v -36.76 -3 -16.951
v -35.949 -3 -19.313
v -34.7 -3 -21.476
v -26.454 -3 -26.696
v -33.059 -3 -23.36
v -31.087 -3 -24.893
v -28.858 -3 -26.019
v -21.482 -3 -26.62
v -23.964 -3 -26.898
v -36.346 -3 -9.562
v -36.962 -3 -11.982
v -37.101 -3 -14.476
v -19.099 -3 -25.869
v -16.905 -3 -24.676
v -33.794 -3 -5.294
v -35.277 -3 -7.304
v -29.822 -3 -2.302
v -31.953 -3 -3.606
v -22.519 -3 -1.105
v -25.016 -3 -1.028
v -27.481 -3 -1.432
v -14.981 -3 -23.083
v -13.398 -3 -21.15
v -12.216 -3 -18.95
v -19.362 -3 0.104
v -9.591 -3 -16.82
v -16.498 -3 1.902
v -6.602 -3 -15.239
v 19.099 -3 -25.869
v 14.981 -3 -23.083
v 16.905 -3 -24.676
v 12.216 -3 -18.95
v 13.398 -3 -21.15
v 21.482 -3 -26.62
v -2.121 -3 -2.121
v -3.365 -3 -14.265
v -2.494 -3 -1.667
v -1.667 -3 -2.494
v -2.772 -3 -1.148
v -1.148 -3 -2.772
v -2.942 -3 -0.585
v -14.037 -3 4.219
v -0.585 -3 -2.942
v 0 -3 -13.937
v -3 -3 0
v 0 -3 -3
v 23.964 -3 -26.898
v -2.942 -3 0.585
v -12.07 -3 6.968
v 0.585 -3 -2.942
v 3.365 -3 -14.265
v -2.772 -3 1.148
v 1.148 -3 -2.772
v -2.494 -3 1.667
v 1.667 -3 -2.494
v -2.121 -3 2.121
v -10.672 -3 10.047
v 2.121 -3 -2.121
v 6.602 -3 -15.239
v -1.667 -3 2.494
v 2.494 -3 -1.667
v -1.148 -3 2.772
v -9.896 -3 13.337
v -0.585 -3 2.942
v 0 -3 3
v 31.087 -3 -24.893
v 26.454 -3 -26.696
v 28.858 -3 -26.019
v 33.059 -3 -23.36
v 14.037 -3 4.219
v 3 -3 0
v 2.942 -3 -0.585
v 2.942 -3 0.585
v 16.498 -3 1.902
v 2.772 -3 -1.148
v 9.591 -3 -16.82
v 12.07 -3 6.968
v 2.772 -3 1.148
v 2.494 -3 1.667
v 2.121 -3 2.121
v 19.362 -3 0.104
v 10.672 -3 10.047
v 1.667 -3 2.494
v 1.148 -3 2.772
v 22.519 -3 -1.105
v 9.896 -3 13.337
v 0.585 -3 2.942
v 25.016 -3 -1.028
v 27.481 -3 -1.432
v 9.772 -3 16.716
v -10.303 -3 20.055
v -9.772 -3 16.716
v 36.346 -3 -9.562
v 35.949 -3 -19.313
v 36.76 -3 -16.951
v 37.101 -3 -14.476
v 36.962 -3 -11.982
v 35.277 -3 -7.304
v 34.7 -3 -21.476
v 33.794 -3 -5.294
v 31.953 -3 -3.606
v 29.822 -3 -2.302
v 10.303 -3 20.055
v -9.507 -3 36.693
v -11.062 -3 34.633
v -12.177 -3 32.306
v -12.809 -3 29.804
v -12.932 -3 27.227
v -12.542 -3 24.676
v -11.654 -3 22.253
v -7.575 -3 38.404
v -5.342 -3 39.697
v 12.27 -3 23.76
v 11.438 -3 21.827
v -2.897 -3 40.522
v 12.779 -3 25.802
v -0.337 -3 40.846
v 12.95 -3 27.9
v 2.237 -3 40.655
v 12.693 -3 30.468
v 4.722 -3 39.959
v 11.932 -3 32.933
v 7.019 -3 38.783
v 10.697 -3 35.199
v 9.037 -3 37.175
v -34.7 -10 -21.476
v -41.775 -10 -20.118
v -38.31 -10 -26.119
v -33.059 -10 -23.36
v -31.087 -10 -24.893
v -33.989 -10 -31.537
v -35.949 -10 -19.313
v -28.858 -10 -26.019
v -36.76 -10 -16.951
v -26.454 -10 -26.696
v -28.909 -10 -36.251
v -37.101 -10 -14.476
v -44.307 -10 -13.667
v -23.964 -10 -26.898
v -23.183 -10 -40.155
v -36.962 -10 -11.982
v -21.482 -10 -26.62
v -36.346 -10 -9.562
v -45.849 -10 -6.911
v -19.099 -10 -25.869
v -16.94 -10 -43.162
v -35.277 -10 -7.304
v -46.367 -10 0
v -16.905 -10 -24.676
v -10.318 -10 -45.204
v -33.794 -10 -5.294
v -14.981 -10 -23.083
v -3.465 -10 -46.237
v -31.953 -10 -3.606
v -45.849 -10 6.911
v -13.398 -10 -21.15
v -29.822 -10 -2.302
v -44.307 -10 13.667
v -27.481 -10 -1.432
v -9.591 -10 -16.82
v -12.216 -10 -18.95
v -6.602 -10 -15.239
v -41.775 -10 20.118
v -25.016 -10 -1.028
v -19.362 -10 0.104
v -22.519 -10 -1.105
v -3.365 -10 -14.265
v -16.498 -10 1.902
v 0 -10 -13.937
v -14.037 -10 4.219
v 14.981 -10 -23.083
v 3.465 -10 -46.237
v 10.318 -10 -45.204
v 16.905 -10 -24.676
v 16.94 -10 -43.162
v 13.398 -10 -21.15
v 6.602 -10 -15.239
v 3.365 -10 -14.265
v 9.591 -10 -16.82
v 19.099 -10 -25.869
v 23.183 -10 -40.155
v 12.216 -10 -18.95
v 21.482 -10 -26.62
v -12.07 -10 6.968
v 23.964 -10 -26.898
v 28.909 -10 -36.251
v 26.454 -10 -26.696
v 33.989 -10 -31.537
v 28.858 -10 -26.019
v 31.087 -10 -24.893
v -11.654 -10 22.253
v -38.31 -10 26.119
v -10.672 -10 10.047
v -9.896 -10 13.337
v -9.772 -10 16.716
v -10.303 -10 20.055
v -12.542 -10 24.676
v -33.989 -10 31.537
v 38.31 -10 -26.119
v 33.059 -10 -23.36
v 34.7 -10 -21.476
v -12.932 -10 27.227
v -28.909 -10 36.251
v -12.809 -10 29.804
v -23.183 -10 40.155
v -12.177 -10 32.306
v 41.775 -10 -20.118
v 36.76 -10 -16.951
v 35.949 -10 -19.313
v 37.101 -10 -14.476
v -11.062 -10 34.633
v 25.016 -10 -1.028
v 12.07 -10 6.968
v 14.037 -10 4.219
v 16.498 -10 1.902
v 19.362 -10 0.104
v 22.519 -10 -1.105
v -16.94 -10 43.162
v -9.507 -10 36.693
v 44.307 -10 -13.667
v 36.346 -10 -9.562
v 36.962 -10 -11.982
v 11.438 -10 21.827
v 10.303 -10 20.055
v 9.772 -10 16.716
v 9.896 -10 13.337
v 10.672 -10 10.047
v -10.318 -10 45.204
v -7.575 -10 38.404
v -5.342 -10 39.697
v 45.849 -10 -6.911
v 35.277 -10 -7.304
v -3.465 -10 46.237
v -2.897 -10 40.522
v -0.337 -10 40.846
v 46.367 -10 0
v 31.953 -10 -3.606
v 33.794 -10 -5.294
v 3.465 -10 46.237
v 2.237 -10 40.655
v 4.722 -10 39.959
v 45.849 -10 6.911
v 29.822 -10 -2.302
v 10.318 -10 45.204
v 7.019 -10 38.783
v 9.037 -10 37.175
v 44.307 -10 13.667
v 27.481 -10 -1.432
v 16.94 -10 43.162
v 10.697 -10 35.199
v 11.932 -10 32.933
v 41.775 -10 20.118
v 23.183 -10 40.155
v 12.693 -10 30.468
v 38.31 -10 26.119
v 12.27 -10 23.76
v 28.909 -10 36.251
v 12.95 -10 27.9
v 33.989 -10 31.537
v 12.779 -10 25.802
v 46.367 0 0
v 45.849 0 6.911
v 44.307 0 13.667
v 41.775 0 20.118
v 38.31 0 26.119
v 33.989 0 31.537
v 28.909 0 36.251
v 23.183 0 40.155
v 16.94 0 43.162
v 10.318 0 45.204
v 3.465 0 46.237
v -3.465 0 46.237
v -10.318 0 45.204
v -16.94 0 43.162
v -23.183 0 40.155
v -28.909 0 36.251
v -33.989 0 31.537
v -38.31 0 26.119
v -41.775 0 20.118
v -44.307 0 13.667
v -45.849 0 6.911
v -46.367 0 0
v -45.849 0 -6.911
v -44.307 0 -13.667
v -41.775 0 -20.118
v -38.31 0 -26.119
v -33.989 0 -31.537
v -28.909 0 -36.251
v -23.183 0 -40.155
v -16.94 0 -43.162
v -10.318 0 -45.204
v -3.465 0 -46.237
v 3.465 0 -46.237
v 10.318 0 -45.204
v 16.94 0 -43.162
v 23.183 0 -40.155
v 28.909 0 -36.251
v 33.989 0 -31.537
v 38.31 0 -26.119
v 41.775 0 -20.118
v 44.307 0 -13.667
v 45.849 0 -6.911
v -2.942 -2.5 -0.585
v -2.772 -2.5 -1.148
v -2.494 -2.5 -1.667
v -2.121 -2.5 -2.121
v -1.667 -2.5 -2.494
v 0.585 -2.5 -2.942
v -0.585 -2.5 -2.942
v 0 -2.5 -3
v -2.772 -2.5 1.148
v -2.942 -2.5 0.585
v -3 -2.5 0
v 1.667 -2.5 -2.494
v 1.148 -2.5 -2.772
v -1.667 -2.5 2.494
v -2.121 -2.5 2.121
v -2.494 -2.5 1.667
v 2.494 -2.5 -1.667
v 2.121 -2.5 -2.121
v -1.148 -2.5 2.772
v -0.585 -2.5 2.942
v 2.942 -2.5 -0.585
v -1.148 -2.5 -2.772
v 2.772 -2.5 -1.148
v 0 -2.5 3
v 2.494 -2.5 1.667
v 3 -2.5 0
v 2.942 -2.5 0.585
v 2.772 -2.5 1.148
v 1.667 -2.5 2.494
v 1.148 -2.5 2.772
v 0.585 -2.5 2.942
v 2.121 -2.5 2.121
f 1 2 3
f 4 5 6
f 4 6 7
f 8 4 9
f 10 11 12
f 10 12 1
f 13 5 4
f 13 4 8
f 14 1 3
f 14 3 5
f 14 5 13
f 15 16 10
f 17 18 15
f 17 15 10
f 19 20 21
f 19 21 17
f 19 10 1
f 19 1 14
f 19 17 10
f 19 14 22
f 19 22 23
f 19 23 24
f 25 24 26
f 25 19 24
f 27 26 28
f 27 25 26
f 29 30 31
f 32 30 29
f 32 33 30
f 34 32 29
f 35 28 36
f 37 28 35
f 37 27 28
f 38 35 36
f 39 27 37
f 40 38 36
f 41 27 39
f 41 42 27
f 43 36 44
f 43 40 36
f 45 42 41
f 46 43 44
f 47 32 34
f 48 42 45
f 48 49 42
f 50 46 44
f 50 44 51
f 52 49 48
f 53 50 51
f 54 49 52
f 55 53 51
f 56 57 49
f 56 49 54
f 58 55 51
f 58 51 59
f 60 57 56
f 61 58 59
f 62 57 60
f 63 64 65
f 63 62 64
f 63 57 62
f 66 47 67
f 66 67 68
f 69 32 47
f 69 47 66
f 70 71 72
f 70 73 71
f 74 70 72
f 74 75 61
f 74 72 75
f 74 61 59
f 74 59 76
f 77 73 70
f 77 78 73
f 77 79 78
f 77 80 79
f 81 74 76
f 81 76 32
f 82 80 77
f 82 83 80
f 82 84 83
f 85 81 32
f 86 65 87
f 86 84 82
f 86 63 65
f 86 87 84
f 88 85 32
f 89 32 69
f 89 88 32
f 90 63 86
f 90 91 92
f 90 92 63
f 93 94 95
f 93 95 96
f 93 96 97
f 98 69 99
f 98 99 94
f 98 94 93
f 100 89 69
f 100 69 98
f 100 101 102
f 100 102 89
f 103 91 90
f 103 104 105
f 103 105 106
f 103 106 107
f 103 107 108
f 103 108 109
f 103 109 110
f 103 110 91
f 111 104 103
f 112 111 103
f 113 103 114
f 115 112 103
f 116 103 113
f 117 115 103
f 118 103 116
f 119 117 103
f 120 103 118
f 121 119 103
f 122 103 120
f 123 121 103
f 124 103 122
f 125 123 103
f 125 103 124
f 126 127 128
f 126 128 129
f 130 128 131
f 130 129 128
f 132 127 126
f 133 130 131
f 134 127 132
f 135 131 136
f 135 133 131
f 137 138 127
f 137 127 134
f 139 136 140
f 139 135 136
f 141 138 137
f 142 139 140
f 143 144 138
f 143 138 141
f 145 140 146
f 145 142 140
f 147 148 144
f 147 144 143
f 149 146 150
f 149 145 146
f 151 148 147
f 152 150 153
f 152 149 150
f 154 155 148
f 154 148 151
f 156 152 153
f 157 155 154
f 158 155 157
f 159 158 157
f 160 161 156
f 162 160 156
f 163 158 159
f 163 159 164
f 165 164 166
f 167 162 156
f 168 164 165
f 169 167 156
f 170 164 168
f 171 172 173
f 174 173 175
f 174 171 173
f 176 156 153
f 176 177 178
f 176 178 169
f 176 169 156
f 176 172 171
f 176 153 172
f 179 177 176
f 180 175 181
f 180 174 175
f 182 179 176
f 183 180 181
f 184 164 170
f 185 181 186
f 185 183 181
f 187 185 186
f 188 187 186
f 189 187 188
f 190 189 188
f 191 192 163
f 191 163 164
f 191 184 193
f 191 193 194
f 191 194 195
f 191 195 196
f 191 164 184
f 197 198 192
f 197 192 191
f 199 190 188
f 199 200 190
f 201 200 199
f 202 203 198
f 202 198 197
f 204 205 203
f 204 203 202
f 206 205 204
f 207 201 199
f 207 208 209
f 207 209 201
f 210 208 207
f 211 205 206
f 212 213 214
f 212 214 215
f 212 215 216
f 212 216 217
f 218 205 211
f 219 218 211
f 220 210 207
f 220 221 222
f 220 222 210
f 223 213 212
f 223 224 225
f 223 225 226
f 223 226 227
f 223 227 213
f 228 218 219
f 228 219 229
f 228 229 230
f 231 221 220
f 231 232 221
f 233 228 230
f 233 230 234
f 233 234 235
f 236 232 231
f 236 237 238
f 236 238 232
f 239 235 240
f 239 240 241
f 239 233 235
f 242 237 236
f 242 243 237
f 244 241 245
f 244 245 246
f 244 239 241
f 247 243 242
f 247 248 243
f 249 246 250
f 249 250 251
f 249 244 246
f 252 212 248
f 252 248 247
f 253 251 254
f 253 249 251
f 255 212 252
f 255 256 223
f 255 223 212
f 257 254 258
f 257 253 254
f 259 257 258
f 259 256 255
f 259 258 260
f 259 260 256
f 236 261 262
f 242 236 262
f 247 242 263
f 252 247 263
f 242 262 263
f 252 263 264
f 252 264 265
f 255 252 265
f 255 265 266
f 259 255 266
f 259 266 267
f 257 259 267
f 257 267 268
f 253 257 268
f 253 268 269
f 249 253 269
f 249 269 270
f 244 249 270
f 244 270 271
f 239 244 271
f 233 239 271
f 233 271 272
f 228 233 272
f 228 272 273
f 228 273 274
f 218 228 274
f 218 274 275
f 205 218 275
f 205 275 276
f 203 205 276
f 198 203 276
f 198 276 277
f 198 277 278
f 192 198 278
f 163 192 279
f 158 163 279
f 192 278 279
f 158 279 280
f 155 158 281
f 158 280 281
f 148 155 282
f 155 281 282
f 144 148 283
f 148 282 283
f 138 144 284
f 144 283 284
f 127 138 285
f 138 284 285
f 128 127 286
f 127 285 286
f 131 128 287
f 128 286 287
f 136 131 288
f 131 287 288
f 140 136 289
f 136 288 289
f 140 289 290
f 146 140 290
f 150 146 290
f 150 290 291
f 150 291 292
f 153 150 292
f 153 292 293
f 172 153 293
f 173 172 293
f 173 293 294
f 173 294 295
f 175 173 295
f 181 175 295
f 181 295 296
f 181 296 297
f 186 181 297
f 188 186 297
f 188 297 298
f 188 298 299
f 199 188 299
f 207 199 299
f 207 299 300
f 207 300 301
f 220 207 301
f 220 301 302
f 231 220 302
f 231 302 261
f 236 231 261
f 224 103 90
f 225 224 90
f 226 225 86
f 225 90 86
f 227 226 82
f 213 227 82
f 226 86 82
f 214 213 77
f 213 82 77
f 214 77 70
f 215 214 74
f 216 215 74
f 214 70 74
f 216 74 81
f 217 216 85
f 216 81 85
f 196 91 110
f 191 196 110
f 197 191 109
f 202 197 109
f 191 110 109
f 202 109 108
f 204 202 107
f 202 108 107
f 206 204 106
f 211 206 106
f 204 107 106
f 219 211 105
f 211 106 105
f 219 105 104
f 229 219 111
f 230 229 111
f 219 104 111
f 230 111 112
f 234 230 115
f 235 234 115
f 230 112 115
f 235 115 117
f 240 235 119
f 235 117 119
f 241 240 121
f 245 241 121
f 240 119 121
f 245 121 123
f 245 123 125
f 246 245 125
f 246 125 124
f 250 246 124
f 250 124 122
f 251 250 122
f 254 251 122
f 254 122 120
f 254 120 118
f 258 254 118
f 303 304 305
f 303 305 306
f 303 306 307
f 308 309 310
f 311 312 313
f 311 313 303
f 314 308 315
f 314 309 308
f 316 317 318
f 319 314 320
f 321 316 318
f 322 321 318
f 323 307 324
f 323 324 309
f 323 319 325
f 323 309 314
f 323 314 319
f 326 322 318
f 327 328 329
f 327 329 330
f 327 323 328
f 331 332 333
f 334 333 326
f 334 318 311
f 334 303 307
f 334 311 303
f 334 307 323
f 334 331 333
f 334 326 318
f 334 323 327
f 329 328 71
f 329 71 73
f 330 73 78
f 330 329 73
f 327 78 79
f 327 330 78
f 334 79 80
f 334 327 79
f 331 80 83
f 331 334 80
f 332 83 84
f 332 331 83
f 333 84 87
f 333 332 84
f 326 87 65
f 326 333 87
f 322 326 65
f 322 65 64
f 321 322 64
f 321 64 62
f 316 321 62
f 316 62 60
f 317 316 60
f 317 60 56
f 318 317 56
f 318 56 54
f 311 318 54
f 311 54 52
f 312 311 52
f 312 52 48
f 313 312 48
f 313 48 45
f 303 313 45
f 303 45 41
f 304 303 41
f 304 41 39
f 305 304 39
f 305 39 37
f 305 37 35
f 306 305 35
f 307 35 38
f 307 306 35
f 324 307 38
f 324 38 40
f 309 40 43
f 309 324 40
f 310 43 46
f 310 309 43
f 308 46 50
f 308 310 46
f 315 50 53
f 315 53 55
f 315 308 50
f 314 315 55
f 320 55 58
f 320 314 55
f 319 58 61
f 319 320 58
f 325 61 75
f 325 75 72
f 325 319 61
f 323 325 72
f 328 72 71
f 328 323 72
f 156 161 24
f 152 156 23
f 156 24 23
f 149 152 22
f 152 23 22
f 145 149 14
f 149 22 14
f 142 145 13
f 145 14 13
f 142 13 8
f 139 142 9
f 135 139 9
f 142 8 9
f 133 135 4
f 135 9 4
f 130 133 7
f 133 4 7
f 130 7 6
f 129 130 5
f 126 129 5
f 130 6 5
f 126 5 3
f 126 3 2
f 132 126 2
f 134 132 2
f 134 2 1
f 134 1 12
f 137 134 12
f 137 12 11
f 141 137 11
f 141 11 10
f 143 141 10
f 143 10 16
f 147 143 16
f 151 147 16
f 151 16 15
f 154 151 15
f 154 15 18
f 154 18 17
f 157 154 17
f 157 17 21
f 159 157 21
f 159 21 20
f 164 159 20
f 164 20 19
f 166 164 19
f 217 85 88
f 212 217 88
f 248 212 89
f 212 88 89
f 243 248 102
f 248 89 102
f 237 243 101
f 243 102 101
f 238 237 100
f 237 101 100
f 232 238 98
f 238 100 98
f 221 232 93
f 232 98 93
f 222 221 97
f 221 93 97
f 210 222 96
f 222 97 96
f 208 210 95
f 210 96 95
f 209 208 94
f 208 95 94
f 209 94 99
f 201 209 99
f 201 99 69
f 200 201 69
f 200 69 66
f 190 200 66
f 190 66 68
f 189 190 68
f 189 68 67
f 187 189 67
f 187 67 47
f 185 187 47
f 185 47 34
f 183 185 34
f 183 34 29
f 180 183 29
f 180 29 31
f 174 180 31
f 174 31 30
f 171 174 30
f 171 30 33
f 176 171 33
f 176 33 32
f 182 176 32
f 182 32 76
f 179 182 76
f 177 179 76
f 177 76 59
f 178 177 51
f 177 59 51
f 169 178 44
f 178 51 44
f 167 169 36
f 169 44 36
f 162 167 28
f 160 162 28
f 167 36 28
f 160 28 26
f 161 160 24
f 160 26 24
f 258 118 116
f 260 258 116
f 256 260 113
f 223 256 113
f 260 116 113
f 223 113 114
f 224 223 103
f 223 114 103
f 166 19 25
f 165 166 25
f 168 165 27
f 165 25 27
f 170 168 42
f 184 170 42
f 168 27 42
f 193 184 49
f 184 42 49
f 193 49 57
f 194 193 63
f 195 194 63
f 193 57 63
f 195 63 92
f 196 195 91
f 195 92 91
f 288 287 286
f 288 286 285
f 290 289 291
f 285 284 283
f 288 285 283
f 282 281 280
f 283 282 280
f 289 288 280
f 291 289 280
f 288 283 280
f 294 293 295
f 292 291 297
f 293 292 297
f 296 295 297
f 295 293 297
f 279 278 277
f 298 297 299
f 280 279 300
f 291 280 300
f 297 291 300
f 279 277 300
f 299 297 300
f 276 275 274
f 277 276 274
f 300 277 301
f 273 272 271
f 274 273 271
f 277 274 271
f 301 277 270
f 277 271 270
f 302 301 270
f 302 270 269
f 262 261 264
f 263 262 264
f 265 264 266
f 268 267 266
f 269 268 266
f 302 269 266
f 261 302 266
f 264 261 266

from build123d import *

# Parameters (mm, degrees)
F0_R     = 46.3668582169
F1_DEPTH = 10
F0_R_2   = 12.95
F0_R_3   = 10.95
F0_R_4   = 3
F2_DEPTH = 3
F0_R_5   = 2.5
F3_DEPTH = 2.5


with BuildPart() as f1:
    # F0 (on Front) → F1 (new body)
    with BuildSketch(Plane.XZ):
        Circle(F0_R)
        with BuildLine():
            ThreePointArc((-10.3030346023, 20.0546205966), (-4.1399397278, 40.1704278267), (12.95, 27.9))
            ThreePointArc((12.95, 27.9), (12.2704278267, 23.7600602722), (10.3030346023, 20.0546205966))
            ThreePointArc((10.3030346023, 20.0546205966), (12.0696833018, 6.9684349033), (22.5193282011, -1.1046205966))
            ThreePointArc((22.5193282011, -1.1046205966), (32.7186411149, -4.2294931122), (37.1121087656, -13.95))
            ThreePointArc((37.1121087656, -13.95), (26.7120297045, -26.6464720771), (12.2162935988, -18.95))
            ThreePointArc((12.2162935988, -18.95), (0, -13.9368698067), (-12.2162935988, -18.95))
            ThreePointArc((-12.2162935988, -18.95), (-35.3771377446, -20.425), (-22.5193282011, -1.1046205966))
            ThreePointArc((-22.5193282011, -1.1046205966), (-12.0696833018, 6.9684349033), (-10.3030346023, 20.0546205966))
        make_face(mode=Mode.SUBTRACT)
    extrude(amount=F1_DEPTH)

    # F0 (on Front) → F2 (join)
    with BuildSketch(Plane.XZ):
        with BuildLine():
            ThreePointArc((10.3030346023, 20.0546205966), (0, 14.95), (-10.3030346023, 20.0546205966))
            ThreePointArc((-10.3030346023, 20.0546205966), (-12.0696833018, 6.9684349033), (-22.5193282011, -1.1046205966))
            ThreePointArc((-22.5193282011, -1.1046205966), (-14.4416018778, -5.3934676507), (-11.2121087656, -13.95))
            ThreePointArc((-11.2121087656, -13.95), (-11.4656366885, -16.4999209389), (-12.2162935988, -18.95))
            ThreePointArc((-12.2162935988, -18.95), (0, -13.9368698067), (12.2162935988, -18.95))
            ThreePointArc((12.2162935988, -18.95), (12.9470797866, -7.475), (22.5193282011, -1.1046205966))
            ThreePointArc((22.5193282011, -1.1046205966), (12.0696833018, 6.9684349033), (10.3030346023, 20.0546205966))
        make_face()
        Circle(F0_R_2, mode=Mode.SUBTRACT)
        Circle(F0_R_2)
        Circle(F0_R_3, mode=Mode.SUBTRACT)
        with BuildLine():
            ThreePointArc((10.3030346023, 20.0546205966), (12.2704278267, 23.7600602722), (12.95, 27.9))
            ThreePointArc((12.95, 27.9), (-4.1399397278, 40.1704278267), (-10.3030346023, 20.0546205966))
            ThreePointArc((-10.3030346023, 20.0546205966), (0, 14.95), (10.3030346023, 20.0546205966))
        make_face()
        with Locations((0, 27.9)):
            Circle(F0_R_3, mode=Mode.SUBTRACT)
        with BuildLine():
            ThreePointArc((37.1121087656, -13.95), (32.7186411149, -4.2294931122), (22.5193282011, -1.1046205966))
            ThreePointArc((22.5193282011, -1.1046205966), (12.9470797866, -7.475), (12.2162935988, -18.95))
            ThreePointArc((12.2162935988, -18.95), (26.7120297045, -26.6464720771), (37.1121087656, -13.95))
        make_face()
        with Locations((24.1621087656, -13.95)):
            Circle(F0_R_3, mode=Mode.SUBTRACT)
        with BuildLine():
            ThreePointArc((-11.2121087656, -13.95), (-14.4416018778, -5.3934676507), (-22.5193282011, -1.1046205966))
            ThreePointArc((-22.5193282011, -1.1046205966), (-35.3771377446, -20.425), (-12.2162935988, -18.95))
            ThreePointArc((-12.2162935988, -18.95), (-11.4656366885, -16.4999209389), (-11.2121087656, -13.95))
        make_face()
        with Locations((-24.1621087656, -13.95)):
            Circle(F0_R_3, mode=Mode.SUBTRACT)
        Circle(F0_R_3)
        Circle(F0_R_4, mode=Mode.SUBTRACT)
        with Locations((0, 27.9)):
            Circle(F0_R_3)
        with Locations((24.1621087656, -13.95)):
            Circle(F0_R_3)
        with Locations((-24.1621087656, -13.95)):
            Circle(F0_R_3)
    extrude(amount=F2_DEPTH)

    # F0 (on Front) → F3 (join)
    with BuildSketch(Plane.XZ):
        Circle(F0_R)
        with BuildLine():
            ThreePointArc((-10.3030346023, 20.0546205966), (-4.1399397278, 40.1704278267), (12.95, 27.9))
            ThreePointArc((12.95, 27.9), (12.2704278267, 23.7600602722), (10.3030346023, 20.0546205966))
            ThreePointArc((10.3030346023, 20.0546205966), (12.0696833018, 6.9684349033), (22.5193282011, -1.1046205966))
            ThreePointArc((22.5193282011, -1.1046205966), (32.7186411149, -4.2294931122), (37.1121087656, -13.95))
            ThreePointArc((37.1121087656, -13.95), (26.7120297045, -26.6464720771), (12.2162935988, -18.95))
            ThreePointArc((12.2162935988, -18.95), (0, -13.9368698067), (-12.2162935988, -18.95))
            ThreePointArc((-12.2162935988, -18.95), (-35.3771377446, -20.425), (-22.5193282011, -1.1046205966))
            ThreePointArc((-22.5193282011, -1.1046205966), (-12.0696833018, 6.9684349033), (-10.3030346023, 20.0546205966))
        make_face(mode=Mode.SUBTRACT)
        Circle(F0_R_4)
        Circle(F0_R_5, mode=Mode.SUBTRACT)
        Circle(F0_R_5)
    extrude(amount=F3_DEPTH)


solid = f1.part
